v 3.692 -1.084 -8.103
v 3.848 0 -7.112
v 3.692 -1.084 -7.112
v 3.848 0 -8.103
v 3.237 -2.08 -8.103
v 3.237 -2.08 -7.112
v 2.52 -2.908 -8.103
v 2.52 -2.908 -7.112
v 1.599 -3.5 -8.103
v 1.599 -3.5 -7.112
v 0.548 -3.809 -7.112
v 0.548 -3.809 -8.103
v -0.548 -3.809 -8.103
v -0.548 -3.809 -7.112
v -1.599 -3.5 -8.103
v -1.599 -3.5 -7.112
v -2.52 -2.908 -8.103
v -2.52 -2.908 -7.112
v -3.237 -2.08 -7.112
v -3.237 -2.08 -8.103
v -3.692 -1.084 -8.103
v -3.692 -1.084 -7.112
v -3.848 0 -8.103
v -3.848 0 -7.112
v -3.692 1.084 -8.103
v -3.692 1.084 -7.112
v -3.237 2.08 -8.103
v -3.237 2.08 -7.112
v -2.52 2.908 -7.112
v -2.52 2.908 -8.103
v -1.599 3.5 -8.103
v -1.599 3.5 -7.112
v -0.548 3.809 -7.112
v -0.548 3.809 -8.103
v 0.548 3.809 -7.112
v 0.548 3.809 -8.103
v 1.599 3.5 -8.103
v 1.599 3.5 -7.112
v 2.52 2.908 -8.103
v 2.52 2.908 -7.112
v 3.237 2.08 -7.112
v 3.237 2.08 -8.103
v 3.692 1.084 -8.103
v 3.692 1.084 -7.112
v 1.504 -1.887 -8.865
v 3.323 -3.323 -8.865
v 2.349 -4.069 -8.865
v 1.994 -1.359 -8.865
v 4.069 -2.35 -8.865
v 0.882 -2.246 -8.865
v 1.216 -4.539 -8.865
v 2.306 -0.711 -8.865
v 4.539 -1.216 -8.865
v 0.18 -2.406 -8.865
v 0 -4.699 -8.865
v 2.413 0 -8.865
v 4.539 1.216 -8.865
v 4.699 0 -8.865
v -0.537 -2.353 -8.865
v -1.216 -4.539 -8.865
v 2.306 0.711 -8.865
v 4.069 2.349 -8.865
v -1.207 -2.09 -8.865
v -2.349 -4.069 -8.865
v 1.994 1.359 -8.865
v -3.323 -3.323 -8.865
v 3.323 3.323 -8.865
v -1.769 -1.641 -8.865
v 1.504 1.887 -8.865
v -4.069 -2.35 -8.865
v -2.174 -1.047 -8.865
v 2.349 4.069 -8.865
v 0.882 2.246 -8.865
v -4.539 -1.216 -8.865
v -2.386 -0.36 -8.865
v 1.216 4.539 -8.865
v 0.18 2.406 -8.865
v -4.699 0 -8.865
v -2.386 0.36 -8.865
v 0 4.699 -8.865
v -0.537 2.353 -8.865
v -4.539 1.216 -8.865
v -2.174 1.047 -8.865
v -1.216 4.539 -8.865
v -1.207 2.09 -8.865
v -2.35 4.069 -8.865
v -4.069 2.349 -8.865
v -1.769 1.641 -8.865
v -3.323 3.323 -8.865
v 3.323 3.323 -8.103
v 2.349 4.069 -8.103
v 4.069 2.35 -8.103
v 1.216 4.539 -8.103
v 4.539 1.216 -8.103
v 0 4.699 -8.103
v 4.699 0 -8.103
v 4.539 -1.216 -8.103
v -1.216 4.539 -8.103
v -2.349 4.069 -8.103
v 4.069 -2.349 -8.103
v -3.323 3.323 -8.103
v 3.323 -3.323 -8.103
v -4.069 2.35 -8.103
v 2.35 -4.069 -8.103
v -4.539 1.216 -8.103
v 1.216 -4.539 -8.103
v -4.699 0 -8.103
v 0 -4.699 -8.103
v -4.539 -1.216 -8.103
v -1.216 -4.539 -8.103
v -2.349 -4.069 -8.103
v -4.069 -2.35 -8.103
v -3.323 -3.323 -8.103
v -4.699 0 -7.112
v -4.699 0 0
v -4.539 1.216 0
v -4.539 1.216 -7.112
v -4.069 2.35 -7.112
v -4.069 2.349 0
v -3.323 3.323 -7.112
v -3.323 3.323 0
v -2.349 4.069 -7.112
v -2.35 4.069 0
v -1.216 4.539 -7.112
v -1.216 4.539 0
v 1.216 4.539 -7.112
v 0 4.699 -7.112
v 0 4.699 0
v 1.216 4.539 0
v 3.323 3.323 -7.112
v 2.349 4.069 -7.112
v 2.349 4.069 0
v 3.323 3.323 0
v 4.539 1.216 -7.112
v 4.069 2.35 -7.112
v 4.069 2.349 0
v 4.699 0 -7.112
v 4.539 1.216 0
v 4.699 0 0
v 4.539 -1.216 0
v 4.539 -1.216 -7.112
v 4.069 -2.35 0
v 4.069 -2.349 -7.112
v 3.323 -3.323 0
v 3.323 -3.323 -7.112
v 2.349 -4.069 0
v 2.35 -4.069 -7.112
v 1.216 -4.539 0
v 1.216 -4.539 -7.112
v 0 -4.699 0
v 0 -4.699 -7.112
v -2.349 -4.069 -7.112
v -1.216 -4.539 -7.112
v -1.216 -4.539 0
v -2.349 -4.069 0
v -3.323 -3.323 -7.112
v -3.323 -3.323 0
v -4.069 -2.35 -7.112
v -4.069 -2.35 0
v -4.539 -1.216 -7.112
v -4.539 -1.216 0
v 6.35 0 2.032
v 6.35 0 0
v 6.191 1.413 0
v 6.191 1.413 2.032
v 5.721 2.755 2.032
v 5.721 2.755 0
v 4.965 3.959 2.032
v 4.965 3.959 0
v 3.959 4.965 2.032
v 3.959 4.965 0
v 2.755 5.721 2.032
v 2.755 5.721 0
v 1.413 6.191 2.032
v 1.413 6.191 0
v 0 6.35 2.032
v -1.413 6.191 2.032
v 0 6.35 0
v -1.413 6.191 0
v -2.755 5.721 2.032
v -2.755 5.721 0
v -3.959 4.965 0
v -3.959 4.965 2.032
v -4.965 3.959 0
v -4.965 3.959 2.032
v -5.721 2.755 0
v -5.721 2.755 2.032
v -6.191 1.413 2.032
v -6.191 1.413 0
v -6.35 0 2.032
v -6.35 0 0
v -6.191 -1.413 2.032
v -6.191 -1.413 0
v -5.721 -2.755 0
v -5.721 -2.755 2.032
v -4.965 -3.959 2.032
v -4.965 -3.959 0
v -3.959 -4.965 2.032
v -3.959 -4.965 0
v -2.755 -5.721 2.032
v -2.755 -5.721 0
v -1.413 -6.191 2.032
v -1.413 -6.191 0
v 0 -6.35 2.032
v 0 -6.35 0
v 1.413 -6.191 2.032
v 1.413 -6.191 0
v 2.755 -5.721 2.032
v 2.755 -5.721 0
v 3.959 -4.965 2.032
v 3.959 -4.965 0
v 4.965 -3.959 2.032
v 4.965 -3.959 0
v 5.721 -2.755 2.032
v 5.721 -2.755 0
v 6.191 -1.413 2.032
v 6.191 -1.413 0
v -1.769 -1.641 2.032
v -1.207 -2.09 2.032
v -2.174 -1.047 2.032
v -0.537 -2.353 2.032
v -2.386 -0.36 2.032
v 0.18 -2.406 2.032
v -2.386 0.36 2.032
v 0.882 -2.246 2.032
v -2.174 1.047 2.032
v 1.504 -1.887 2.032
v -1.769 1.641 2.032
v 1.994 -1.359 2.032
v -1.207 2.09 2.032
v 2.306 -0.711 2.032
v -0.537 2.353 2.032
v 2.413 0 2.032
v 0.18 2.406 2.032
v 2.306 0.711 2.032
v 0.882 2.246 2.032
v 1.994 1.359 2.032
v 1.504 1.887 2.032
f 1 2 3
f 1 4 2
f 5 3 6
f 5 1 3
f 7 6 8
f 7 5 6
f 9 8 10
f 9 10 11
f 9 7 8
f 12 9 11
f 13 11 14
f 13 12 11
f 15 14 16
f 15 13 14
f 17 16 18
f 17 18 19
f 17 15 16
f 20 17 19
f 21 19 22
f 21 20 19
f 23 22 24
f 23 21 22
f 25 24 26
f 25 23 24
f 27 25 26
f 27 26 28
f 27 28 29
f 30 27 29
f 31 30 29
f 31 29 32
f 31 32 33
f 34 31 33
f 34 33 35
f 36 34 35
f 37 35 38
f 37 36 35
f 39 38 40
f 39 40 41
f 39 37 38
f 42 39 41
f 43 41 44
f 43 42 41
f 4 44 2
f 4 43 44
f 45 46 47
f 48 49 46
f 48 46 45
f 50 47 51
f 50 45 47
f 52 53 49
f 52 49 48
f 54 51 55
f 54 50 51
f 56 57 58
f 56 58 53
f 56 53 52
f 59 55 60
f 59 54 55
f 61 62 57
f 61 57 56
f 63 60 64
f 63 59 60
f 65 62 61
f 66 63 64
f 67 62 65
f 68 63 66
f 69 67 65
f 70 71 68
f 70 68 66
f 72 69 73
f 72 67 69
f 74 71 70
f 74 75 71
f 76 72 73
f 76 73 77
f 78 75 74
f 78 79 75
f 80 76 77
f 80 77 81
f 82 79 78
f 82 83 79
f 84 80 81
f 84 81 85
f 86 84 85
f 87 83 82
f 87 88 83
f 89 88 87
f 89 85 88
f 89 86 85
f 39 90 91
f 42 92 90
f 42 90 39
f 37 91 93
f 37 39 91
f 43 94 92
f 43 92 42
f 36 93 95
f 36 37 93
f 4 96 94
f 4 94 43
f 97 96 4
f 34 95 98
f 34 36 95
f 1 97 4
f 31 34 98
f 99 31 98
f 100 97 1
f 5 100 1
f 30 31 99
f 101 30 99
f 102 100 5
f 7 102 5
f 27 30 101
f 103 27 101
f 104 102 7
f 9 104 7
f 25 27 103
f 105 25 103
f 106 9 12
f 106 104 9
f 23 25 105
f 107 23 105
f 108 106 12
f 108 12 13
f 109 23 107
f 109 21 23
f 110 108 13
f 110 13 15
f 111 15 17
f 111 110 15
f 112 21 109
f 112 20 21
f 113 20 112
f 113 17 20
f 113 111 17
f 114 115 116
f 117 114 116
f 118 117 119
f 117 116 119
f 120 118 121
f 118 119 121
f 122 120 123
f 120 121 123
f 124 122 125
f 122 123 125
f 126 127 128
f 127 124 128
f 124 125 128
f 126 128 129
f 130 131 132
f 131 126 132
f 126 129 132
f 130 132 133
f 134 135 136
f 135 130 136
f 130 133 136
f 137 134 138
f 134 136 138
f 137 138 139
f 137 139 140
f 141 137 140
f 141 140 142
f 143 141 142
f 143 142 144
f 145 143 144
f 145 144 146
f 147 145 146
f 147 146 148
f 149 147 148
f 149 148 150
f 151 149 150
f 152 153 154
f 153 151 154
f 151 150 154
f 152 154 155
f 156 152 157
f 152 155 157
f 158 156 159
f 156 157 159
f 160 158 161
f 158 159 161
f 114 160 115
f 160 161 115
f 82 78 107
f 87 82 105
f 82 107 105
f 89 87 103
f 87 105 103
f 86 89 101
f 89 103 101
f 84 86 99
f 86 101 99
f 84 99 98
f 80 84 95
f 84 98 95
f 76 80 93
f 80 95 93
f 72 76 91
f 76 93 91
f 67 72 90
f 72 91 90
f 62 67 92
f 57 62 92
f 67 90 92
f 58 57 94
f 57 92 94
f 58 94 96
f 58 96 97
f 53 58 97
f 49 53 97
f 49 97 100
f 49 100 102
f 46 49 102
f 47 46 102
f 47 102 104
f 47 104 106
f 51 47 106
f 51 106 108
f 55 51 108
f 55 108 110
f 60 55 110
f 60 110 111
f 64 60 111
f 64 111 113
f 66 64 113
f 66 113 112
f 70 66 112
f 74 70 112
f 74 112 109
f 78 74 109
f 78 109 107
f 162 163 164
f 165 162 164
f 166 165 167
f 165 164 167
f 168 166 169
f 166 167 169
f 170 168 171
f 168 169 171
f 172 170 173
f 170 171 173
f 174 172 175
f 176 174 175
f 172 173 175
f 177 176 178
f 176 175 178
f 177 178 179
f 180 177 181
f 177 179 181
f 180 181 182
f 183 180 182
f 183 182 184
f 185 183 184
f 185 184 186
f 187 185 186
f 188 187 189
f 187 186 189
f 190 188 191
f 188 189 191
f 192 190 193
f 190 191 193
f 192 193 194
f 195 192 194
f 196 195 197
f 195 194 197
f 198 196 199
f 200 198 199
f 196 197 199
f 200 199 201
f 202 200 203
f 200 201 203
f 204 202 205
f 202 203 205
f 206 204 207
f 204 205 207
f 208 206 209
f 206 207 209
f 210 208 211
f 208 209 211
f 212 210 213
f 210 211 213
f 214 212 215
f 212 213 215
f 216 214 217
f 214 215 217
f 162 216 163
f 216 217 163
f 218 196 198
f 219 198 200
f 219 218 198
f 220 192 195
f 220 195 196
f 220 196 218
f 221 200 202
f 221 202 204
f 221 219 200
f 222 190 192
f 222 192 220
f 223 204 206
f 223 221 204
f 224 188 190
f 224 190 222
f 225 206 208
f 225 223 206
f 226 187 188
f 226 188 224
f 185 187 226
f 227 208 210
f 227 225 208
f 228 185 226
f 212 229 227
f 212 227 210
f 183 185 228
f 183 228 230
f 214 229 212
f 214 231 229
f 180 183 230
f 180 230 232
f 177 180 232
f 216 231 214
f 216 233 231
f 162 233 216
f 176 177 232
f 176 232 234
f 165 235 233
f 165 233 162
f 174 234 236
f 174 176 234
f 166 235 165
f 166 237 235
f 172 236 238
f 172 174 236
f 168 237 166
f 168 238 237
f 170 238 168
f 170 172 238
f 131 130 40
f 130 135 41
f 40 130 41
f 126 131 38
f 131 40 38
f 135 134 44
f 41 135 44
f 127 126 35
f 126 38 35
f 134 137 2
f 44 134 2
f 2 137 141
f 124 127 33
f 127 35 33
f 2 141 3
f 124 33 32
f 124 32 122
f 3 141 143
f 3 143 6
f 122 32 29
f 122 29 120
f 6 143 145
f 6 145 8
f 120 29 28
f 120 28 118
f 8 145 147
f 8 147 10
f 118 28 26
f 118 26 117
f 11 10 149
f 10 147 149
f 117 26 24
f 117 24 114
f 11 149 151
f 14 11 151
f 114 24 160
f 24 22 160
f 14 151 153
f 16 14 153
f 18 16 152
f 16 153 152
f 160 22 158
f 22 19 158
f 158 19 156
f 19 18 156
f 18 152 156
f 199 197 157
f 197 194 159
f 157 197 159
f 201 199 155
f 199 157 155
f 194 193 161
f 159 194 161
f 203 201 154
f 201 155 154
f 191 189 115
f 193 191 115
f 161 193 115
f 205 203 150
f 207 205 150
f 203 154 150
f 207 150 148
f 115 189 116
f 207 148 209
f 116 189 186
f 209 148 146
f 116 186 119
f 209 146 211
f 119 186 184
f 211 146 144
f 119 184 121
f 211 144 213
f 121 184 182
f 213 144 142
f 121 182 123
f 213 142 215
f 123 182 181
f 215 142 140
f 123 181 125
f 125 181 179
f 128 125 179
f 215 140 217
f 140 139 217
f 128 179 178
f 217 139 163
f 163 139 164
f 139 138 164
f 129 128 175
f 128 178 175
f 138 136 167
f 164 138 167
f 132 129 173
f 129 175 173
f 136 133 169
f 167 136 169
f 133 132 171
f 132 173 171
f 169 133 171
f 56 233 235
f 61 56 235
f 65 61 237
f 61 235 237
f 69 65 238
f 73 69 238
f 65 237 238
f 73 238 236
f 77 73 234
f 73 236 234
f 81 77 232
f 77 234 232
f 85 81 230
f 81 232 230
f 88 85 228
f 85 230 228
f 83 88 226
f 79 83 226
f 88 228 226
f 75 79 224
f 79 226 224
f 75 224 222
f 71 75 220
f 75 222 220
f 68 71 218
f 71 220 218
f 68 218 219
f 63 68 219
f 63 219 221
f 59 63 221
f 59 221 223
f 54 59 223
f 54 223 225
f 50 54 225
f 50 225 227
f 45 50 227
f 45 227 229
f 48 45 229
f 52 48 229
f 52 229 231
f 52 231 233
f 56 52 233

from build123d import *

# Parameters (mm, degrees)
SKETCH1_R           = 6.35
BOSS_EXTRUDE1_DEPTH = 2.032
SKETCH2_R           = 4.699
BOSS_EXTRUDE2_DEPTH = 8.8646
SKETCH4_W           = 0.9906
SKETCH4_H           = 0.8509
SKETCH8_R           = 2.413
CUT_EXTRUDE2_DEPTH  = 15.24


with BuildPart() as part:
    # Sketch1 → Boss-Extrude1 (new body)
    with BuildSketch(Plane.XY):
        Circle(SKETCH1_R)
    extrude(amount=BOSS_EXTRUDE1_DEPTH)

    # Sketch2 → Boss-Extrude2 (add)
    with BuildSketch(Plane(origin=(0, 0, 0), x_dir=(-1, 0, 0), z_dir=(0, 0, -1))):
        Circle(SKETCH2_R)
    extrude(amount=BOSS_EXTRUDE2_DEPTH)

    # Sketch4 → Cut-Revolve1 (revolve, cut)
    with BuildSketch(Plane(origin=(0, 0, 0), x_dir=(0, 0, -1), z_dir=(1, 0, 0)), mode=Mode.PRIVATE) as cut_revolve1_sk:
        with Locations((7.6073, 4.27355)):
            Rectangle(SKETCH4_W, SKETCH4_H)
    revolve(cut_revolve1_sk.sketch.rotate(Axis((0, 0, 6.549062663), (0, 0, -1)), 90), axis=Axis((0, 0, 6.549062663), (0, 0, -1)), mode=Mode.SUBTRACT)

    # Sketch8 → Cut-Extrude2 (cut)
    with BuildSketch(Plane.XY.offset(2.032)):
        Circle(SKETCH8_R)
    extrude(amount=-CUT_EXTRUDE2_DEPTH, mode=Mode.SUBTRACT)


solid = part.part
